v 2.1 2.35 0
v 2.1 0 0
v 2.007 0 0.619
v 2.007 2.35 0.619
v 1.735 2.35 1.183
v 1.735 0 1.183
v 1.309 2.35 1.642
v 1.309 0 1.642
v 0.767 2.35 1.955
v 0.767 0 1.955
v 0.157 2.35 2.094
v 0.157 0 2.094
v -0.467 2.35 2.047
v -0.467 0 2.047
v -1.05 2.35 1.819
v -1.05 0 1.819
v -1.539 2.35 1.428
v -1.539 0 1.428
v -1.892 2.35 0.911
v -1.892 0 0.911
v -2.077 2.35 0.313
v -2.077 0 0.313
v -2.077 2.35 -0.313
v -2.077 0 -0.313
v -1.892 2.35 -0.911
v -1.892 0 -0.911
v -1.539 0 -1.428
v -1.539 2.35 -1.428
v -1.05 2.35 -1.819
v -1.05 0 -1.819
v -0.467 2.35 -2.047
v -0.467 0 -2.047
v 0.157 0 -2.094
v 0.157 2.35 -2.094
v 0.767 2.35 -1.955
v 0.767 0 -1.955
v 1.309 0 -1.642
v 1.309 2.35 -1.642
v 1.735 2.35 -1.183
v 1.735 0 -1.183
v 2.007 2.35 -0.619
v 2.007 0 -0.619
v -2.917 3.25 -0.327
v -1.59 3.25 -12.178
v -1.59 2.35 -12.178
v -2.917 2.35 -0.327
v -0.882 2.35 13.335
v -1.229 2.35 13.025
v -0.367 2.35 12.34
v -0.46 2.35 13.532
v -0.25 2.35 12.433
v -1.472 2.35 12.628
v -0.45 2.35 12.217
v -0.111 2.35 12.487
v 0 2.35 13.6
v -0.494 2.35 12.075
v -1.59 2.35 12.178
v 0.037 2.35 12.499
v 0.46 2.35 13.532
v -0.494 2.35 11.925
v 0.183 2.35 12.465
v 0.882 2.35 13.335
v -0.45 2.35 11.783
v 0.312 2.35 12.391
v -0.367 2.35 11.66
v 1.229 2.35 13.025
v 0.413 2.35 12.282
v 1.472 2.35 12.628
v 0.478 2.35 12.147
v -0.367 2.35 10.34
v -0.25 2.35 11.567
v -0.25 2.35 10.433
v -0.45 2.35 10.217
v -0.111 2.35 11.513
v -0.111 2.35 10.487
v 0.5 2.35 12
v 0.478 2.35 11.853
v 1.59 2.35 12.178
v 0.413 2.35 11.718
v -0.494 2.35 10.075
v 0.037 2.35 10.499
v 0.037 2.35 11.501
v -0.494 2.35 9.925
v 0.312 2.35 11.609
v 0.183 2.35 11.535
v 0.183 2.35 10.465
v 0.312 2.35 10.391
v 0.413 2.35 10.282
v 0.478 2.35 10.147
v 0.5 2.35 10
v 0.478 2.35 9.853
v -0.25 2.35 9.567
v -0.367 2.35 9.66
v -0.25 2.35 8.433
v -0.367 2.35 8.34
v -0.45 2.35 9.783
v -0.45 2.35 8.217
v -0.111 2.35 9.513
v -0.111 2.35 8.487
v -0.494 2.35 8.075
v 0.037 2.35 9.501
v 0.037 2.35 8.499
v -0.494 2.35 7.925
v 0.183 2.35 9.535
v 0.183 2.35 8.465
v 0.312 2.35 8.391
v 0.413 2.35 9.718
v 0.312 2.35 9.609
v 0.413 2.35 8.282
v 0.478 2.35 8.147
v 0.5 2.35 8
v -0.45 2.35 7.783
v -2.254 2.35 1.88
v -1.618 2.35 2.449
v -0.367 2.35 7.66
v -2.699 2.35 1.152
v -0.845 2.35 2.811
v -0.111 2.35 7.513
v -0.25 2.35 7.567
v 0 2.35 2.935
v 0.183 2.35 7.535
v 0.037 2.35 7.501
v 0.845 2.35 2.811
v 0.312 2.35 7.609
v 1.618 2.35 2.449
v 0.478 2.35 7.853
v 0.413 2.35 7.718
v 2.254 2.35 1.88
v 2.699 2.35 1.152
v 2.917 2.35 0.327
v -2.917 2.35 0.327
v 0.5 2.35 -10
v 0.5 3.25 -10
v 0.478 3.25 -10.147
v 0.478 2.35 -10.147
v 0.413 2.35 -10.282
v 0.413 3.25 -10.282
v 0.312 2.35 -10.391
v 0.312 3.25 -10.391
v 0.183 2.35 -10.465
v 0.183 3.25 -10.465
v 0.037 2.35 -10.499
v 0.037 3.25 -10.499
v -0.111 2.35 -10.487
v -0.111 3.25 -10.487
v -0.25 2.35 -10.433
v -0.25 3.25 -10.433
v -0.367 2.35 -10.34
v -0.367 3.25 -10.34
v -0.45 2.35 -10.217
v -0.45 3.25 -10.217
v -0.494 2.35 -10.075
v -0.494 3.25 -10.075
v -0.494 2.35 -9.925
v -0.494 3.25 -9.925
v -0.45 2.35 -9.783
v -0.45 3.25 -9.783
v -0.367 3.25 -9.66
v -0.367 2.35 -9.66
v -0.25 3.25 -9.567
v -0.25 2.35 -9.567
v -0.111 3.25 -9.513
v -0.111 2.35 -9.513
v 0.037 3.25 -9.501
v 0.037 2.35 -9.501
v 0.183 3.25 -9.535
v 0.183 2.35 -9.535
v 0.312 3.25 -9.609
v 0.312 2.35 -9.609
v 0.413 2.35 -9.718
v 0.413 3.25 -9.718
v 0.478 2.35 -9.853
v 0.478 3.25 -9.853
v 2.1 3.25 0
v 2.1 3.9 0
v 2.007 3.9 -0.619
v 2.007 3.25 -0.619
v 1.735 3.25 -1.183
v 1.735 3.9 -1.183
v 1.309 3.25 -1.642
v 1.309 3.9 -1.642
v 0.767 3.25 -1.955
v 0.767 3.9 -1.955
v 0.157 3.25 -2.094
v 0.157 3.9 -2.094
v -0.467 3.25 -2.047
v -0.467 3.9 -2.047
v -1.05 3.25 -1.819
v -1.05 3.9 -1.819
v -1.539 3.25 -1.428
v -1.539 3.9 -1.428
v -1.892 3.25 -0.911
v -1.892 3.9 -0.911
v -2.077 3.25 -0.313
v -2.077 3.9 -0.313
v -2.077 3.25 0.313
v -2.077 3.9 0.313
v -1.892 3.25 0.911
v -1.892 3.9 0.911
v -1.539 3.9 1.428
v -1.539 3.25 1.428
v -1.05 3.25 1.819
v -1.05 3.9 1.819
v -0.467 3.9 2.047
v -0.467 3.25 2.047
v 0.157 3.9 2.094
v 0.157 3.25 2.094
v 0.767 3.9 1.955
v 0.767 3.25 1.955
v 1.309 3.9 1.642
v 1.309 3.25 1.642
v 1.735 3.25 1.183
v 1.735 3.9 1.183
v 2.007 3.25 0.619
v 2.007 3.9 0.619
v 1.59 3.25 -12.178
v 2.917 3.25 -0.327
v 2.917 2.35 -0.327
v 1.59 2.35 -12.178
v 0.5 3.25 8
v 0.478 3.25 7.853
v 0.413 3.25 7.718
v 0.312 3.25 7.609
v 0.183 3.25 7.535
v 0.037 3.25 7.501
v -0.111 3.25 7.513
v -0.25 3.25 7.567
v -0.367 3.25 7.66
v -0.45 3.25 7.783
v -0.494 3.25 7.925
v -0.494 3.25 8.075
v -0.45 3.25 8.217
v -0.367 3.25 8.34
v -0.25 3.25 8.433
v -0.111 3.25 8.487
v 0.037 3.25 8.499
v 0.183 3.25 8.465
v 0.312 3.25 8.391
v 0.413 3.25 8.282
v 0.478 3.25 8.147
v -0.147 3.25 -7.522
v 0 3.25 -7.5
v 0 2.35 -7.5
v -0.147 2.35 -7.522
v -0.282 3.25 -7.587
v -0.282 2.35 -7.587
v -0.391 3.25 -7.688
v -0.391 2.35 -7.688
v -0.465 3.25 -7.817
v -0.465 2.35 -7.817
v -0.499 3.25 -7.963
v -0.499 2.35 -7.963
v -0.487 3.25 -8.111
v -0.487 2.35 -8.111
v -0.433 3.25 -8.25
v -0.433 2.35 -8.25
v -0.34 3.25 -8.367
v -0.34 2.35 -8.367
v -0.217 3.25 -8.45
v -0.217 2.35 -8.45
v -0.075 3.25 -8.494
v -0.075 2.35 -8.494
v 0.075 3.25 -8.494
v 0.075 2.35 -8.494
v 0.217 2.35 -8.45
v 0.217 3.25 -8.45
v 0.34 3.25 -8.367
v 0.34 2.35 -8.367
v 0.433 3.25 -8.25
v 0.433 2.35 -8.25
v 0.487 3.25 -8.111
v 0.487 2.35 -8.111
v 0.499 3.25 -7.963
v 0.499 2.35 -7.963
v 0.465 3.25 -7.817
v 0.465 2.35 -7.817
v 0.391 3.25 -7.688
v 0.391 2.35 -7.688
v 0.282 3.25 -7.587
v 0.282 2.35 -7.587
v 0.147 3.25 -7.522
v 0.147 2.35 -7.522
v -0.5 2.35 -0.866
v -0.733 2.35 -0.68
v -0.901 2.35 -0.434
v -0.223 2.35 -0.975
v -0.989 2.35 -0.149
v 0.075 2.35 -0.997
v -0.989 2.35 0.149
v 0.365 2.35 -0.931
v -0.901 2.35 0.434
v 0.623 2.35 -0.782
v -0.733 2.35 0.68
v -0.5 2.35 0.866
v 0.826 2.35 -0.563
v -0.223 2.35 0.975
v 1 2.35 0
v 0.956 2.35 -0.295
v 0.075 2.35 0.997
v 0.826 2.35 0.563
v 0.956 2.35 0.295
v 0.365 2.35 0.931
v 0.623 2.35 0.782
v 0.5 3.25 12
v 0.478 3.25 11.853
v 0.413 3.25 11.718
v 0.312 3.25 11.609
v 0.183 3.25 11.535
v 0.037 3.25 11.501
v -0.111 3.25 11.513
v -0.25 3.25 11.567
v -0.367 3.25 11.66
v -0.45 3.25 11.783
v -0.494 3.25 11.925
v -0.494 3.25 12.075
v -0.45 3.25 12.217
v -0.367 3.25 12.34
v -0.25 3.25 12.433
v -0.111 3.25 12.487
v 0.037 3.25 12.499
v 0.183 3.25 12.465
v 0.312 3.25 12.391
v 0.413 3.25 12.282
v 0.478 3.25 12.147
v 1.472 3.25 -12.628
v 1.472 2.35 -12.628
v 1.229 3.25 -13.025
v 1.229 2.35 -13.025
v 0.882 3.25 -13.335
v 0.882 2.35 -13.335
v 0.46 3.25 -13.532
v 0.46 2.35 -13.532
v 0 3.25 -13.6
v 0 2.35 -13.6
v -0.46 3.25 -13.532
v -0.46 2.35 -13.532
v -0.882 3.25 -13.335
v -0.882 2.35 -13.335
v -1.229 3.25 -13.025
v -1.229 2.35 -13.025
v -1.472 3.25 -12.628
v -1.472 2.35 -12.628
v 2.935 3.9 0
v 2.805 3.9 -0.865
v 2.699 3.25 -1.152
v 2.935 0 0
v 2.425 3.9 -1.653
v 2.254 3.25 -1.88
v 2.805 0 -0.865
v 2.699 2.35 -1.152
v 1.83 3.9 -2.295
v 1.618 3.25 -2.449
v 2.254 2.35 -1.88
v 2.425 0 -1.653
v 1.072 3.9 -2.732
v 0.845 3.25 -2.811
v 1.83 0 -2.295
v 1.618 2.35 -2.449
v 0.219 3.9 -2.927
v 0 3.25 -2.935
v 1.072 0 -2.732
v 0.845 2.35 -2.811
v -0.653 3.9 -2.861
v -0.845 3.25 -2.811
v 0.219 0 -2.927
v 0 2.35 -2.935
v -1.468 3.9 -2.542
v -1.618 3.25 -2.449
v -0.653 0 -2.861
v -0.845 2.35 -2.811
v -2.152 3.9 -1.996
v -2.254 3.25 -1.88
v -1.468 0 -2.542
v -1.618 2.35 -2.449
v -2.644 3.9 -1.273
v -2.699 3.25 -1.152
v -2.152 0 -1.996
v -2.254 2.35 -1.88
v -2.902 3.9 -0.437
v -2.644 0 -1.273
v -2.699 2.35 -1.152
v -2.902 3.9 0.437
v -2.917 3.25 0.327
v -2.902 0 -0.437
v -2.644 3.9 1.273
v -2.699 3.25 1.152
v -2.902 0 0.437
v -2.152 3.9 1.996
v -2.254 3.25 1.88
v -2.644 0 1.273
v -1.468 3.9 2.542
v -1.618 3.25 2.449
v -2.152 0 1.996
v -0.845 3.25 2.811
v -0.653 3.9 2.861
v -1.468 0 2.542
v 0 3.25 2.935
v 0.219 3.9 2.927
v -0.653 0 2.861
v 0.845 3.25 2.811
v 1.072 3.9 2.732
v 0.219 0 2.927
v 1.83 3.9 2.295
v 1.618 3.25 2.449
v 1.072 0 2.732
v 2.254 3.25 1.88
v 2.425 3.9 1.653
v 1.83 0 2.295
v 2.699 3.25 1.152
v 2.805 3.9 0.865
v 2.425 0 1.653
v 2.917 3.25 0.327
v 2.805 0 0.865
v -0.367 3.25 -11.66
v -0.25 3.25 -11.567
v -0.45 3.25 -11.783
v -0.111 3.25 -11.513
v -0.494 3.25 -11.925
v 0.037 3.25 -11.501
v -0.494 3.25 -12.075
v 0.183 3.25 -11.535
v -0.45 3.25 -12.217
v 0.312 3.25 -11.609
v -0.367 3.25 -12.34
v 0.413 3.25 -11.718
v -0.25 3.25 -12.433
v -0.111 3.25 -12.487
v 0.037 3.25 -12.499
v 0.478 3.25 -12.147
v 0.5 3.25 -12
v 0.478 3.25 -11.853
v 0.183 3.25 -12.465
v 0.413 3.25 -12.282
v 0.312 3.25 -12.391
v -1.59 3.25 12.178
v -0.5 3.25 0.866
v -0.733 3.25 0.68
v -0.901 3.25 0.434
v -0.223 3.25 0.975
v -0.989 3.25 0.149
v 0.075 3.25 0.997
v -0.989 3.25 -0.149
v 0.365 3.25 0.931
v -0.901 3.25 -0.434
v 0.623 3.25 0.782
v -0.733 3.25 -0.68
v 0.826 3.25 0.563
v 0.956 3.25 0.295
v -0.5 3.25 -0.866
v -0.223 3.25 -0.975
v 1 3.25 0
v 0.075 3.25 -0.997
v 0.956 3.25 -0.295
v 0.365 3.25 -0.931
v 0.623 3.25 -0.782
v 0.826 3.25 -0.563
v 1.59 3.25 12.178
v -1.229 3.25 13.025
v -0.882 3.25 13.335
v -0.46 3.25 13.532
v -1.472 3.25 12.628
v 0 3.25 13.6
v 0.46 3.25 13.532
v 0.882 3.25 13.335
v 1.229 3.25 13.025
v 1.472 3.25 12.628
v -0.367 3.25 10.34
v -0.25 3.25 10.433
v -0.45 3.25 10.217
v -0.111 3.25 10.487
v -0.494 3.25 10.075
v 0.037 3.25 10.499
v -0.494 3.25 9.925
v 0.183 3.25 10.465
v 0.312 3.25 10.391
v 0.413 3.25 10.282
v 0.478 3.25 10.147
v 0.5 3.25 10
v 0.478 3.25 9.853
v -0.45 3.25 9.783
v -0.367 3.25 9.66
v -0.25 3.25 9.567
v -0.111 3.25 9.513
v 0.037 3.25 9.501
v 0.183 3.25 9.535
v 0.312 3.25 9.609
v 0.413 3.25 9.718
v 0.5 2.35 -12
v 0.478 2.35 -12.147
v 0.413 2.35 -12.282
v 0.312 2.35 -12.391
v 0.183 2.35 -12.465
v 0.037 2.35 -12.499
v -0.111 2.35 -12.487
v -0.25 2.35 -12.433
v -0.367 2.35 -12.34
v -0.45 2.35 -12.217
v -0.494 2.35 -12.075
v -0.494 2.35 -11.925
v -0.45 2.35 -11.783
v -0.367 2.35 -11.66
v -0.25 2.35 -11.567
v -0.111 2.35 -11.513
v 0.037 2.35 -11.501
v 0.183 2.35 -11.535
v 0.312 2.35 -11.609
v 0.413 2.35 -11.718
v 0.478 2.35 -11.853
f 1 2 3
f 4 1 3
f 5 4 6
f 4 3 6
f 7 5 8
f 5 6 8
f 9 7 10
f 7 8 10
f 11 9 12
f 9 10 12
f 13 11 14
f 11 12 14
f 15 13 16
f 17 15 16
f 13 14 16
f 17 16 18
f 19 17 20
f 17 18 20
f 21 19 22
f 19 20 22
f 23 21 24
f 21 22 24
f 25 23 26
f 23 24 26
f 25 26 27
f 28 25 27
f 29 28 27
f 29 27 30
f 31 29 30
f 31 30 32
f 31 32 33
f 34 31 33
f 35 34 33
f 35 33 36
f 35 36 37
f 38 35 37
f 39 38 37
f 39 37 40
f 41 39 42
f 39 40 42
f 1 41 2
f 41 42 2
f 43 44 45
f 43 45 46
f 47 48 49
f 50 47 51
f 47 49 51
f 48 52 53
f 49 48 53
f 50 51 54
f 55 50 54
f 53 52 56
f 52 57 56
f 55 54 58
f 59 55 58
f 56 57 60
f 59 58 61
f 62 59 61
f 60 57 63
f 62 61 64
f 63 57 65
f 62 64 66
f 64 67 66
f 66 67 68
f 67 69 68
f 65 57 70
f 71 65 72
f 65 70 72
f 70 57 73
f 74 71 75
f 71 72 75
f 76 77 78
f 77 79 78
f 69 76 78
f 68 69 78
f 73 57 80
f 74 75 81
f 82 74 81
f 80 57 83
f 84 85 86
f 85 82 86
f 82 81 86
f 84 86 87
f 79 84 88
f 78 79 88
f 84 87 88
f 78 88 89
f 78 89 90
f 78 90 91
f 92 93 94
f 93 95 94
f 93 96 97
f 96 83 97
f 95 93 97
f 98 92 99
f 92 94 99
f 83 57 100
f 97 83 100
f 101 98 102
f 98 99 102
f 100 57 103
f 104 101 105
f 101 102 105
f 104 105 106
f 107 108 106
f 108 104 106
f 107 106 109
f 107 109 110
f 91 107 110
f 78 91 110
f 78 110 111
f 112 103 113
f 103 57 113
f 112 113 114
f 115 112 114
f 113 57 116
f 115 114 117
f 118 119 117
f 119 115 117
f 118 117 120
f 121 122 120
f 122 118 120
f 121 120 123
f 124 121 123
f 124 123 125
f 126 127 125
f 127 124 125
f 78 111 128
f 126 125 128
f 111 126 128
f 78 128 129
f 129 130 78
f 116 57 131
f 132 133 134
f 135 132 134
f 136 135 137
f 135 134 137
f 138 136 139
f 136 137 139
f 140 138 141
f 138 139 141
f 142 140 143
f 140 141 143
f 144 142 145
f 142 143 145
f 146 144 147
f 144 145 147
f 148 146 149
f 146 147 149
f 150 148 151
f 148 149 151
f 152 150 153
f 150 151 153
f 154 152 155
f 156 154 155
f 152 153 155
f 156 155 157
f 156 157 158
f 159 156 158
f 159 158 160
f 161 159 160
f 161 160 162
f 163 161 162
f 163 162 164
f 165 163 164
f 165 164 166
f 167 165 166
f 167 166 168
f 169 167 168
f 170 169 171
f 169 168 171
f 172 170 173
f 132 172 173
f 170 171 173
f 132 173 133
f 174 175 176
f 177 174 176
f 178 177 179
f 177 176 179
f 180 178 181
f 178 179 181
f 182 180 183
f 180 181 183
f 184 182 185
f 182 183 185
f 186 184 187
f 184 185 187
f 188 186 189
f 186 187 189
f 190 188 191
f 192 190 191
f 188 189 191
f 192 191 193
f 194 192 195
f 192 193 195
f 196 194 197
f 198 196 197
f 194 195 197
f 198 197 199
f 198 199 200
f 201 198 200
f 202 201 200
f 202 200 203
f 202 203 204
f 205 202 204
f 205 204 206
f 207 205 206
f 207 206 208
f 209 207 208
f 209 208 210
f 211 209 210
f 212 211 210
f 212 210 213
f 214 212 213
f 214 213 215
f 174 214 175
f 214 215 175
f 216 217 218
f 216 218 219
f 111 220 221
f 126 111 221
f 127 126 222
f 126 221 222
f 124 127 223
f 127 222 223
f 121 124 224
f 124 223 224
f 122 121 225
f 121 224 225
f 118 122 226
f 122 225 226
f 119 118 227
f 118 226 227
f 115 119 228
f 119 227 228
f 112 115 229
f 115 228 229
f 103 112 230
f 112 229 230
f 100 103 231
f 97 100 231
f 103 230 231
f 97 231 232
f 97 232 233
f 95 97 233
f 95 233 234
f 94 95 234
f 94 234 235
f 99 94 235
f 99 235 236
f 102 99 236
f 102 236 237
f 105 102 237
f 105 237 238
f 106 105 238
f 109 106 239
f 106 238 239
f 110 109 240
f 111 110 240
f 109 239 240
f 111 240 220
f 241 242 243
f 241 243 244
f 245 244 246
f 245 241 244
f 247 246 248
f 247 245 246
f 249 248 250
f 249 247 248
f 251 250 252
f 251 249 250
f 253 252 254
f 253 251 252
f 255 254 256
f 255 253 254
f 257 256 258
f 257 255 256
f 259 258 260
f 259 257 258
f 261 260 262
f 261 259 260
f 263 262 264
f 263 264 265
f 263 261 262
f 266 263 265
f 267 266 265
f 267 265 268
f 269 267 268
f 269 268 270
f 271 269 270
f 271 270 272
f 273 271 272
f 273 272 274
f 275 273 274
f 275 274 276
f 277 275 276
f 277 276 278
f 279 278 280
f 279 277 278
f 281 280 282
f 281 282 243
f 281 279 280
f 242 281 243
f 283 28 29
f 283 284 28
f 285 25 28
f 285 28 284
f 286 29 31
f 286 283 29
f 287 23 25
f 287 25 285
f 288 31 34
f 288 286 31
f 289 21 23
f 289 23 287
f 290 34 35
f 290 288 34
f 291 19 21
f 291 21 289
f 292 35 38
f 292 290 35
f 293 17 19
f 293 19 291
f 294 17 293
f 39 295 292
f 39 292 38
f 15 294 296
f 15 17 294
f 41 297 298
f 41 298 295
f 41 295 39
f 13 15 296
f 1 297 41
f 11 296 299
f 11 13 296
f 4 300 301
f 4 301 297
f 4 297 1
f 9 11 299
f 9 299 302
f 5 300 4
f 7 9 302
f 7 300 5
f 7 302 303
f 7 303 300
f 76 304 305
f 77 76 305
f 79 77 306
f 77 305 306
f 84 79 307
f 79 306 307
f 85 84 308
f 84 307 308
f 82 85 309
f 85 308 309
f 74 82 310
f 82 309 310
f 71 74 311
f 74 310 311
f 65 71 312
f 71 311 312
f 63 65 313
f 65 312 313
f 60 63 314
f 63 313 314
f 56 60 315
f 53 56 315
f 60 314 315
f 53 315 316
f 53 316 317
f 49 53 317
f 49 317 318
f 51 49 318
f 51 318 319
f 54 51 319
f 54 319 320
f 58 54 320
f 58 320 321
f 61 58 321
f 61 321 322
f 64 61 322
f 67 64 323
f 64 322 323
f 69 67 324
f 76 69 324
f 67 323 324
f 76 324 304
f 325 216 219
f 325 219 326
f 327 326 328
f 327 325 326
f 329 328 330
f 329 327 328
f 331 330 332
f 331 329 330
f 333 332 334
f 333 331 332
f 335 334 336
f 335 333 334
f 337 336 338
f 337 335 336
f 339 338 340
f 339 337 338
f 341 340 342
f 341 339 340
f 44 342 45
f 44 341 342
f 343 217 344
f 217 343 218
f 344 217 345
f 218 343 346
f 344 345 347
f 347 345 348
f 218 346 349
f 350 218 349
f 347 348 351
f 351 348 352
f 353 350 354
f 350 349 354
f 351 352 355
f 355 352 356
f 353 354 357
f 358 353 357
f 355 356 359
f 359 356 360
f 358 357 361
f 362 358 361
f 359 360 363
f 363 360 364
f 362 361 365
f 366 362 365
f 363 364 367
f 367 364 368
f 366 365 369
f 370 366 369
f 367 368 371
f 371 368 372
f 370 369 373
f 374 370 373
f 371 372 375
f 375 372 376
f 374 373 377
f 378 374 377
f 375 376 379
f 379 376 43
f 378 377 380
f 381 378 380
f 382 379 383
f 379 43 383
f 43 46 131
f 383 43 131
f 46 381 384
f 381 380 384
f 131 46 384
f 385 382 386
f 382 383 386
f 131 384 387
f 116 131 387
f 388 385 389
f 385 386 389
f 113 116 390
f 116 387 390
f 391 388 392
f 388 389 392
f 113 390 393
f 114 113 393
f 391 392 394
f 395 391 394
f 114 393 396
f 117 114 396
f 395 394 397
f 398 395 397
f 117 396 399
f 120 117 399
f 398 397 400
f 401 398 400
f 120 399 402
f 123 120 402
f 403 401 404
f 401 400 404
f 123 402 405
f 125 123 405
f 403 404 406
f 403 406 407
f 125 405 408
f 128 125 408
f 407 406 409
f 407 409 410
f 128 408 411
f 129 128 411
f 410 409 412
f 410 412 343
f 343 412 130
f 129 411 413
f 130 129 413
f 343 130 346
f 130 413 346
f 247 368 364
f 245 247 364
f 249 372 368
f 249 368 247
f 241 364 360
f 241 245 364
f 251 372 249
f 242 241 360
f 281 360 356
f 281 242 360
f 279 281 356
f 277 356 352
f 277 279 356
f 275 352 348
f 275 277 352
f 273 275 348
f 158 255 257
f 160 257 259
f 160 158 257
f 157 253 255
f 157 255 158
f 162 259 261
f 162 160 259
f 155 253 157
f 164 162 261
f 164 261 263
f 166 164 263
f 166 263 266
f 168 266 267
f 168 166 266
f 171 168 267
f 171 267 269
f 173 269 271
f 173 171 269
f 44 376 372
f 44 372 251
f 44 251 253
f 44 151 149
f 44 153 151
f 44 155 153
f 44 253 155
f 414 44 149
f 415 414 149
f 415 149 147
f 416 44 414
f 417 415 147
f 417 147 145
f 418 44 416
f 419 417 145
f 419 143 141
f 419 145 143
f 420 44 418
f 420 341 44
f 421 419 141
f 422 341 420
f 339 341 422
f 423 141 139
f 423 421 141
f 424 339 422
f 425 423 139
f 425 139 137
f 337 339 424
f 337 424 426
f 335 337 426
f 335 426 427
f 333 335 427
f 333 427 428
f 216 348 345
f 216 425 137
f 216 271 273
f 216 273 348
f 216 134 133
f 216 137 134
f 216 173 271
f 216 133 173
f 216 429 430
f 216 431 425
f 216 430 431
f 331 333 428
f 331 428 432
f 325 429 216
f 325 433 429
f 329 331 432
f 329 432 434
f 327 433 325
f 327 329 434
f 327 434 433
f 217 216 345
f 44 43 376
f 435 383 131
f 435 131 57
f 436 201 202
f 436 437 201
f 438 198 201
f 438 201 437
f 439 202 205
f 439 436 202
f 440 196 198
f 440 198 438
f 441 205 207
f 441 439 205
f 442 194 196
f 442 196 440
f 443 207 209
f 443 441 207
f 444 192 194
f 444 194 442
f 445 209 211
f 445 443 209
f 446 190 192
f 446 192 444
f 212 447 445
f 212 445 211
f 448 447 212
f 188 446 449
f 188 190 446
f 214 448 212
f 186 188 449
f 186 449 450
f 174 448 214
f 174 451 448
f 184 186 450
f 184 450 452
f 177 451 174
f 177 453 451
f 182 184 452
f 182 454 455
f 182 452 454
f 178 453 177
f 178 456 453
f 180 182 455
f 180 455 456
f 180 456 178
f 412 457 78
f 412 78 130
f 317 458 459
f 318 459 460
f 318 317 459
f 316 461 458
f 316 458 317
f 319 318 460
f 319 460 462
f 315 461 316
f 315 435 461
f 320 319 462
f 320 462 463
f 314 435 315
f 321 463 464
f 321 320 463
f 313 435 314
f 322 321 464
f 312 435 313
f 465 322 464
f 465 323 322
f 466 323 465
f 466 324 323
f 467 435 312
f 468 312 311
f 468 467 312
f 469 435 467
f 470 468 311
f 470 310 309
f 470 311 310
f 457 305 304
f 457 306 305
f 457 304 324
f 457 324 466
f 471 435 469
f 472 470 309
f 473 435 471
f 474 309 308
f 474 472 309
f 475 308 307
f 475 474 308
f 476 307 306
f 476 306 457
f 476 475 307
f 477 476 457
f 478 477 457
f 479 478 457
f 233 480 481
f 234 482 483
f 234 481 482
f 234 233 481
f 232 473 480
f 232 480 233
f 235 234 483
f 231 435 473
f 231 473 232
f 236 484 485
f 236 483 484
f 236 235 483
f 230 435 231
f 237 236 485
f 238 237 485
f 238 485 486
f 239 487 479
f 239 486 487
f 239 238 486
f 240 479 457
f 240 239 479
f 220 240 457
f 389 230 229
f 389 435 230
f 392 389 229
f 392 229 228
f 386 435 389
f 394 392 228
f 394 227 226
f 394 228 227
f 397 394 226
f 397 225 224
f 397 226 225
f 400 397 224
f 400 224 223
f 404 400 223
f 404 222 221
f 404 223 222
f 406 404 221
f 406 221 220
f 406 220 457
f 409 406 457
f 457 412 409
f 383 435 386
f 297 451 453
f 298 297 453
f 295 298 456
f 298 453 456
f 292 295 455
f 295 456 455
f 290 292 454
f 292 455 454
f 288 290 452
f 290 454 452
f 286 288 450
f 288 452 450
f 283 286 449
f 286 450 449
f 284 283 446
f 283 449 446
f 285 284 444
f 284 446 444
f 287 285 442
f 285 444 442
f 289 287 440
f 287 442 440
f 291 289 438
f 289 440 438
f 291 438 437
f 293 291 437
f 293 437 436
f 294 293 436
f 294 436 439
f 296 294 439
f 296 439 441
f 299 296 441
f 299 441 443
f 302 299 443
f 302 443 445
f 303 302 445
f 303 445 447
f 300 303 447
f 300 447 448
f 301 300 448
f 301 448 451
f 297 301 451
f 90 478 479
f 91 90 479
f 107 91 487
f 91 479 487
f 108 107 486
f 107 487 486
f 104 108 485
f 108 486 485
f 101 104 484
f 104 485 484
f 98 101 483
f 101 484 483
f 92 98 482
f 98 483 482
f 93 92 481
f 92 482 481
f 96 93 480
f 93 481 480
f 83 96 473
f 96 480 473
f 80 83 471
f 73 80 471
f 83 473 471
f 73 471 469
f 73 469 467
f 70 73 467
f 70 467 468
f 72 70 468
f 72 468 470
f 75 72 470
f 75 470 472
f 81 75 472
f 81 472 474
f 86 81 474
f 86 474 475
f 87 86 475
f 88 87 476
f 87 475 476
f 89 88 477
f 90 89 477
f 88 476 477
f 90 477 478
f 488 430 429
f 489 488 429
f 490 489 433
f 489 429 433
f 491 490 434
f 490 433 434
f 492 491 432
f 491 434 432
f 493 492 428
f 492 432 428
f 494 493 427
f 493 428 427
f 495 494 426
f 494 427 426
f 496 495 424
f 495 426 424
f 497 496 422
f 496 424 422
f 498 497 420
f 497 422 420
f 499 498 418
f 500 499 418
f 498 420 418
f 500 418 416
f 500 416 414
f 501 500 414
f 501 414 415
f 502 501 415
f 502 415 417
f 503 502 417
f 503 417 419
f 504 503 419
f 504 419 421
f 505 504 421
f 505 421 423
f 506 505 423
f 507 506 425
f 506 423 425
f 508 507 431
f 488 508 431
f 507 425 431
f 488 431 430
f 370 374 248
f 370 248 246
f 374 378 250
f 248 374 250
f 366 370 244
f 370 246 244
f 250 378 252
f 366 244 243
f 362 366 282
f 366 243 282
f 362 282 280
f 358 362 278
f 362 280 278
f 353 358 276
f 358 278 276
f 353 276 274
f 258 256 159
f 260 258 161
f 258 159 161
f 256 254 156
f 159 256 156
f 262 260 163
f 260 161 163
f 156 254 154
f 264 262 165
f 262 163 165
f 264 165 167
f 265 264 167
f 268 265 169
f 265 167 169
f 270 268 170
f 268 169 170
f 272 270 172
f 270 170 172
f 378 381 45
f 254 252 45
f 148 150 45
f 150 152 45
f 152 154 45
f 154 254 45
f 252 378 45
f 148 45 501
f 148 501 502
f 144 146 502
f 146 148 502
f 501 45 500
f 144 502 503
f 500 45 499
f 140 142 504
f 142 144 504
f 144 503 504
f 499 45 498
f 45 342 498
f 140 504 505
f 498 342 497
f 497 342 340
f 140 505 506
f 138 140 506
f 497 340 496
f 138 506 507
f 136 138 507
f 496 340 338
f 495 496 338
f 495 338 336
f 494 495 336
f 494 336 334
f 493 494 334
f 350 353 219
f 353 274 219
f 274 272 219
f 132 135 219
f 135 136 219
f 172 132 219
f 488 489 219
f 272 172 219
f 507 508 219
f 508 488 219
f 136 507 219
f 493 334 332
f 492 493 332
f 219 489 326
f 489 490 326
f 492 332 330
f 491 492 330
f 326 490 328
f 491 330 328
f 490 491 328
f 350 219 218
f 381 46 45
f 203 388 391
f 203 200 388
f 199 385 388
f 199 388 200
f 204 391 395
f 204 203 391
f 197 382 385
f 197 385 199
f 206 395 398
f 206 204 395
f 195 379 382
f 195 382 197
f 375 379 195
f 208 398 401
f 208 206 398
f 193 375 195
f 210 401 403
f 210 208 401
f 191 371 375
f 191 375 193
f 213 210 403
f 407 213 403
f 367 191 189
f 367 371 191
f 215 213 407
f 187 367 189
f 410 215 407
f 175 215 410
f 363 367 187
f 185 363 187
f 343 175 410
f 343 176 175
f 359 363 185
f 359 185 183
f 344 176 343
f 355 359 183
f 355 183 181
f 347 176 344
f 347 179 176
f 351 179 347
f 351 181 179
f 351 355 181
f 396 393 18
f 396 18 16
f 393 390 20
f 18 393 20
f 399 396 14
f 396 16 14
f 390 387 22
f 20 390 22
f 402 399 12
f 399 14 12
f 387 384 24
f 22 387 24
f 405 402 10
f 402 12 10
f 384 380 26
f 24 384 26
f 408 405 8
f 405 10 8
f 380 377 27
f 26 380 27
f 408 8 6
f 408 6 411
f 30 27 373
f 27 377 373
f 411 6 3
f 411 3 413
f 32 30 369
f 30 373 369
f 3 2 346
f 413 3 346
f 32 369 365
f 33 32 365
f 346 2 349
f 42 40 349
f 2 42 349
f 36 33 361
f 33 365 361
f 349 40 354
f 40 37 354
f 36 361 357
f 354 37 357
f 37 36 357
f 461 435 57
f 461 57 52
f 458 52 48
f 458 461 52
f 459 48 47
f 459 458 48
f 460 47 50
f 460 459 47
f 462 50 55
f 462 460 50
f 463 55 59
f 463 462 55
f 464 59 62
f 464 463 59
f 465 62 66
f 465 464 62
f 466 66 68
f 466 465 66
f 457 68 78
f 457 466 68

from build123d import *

# Parameters (mm, degrees)
SKETCH1_R           = 2.935
BOSS_EXTRUDE2_DEPTH = 3.25
SKETCH2_R           = 0.5
BOSS_EXTRUDE3_DEPTH = 0.9
SKETCH3_R           = 2.935
BOSS_EXTRUDE4_DEPTH = 0.65
SKETCH4_R           = 2.1
CUT_EXTRUDE1_DEPTH  = 0.65
SKETCH5_R           = 1
CUT_EXTRUDE2_DEPTH  = 5.65
SKETCH6_R           = 2.1
CUT_EXTRUDE3_DEPTH  = 2.35


with BuildPart() as part:
    # Sketch1 → Boss-Extrude2 (new body)
    with BuildSketch(Plane(origin=(0, 0, 0), x_dir=(1, 0, 0), z_dir=(0, 1, 0))):
        Circle(SKETCH1_R)
    extrude(amount=BOSS_EXTRUDE2_DEPTH)

    # Sketch2 → Boss-Extrude3 (add)
    with BuildSketch(Plane(origin=(0, 3.25, 0), x_dir=(1, 0, 0), z_dir=(0, 1, 0))):
        with BuildLine():
            ThreePointArc((-2.916780846, 0.32651875), (-1.956513796, 2.18775656), (0, 2.935))
            ThreePointArc((0, 2.935), (1.956513796, 2.18775656), (2.916780846, 0.32651875))
            Line((2.916780846, 0.32651875), (1.590067923, 12.178))
            ThreePointArc((1.590067923, 12.178), (0, 13.6), (-1.590067923, 12.178))
            Line((-1.590067923, 12.178), (-2.916780846, 0.32651875))
        make_face()
        with BuildLine():
            ThreePointArc((0, 8.5), (0.5, 8), (0, 7.5))
            ThreePointArc((0, 7.5), (-0.5, 8), (0, 8.5))
        make_face(mode=Mode.SUBTRACT)
        with Locations((0, 10)):
            Circle(SKETCH2_R, mode=Mode.SUBTRACT)
        with Locations((0, 12)):
            Circle(SKETCH2_R, mode=Mode.SUBTRACT)
        with BuildLine():
            Line((1.590067923, -12.178), (2.916780846, -0.32651875))
            ThreePointArc((2.916780846, -0.32651875), (0, -2.935), (-2.916780846, -0.32651875))
            Line((-2.916780846, -0.32651875), (-1.590067923, -12.178))
            ThreePointArc((-1.590067923, -12.178), (0, -13.6), (1.590067923, -12.178))
        make_face()
        with Locations((0, -12)):
            Circle(SKETCH2_R, mode=Mode.SUBTRACT)
        with Locations((0, -10)):
            Circle(SKETCH2_R, mode=Mode.SUBTRACT)
        with Locations((0, -8)):
            Circle(SKETCH2_R, mode=Mode.SUBTRACT)
    extrude(amount=-BOSS_EXTRUDE3_DEPTH)

    # Sketch3 → Boss-Extrude4 (add)
    with BuildSketch(Plane(origin=(0, 3.25, 0), x_dir=(1, 0, 0), z_dir=(0, 1, 0))):
        Circle(SKETCH3_R)
    extrude(amount=BOSS_EXTRUDE4_DEPTH)

    # Sketch4 → Cut-Extrude1 (cut)
    with BuildSketch(Plane(origin=(0, 3.9, 0), x_dir=(1, 0, 0), z_dir=(0, 1, 0))):
        Circle(SKETCH4_R)
    extrude(amount=-CUT_EXTRUDE1_DEPTH, mode=Mode.SUBTRACT)

    # Sketch5 → Cut-Extrude2 (cut)
    with BuildSketch(Plane(origin=(0, 3.25, 0), x_dir=(1, 0, 0), z_dir=(0, 1, 0))):
        Circle(SKETCH5_R)
    extrude(amount=-CUT_EXTRUDE2_DEPTH, mode=Mode.SUBTRACT)

    # Sketch6 → Cut-Extrude3 (cut)
    with BuildSketch(Plane.XZ):
        Circle(SKETCH6_R)
    extrude(amount=-CUT_EXTRUDE3_DEPTH, mode=Mode.SUBTRACT)


solid = part.part
